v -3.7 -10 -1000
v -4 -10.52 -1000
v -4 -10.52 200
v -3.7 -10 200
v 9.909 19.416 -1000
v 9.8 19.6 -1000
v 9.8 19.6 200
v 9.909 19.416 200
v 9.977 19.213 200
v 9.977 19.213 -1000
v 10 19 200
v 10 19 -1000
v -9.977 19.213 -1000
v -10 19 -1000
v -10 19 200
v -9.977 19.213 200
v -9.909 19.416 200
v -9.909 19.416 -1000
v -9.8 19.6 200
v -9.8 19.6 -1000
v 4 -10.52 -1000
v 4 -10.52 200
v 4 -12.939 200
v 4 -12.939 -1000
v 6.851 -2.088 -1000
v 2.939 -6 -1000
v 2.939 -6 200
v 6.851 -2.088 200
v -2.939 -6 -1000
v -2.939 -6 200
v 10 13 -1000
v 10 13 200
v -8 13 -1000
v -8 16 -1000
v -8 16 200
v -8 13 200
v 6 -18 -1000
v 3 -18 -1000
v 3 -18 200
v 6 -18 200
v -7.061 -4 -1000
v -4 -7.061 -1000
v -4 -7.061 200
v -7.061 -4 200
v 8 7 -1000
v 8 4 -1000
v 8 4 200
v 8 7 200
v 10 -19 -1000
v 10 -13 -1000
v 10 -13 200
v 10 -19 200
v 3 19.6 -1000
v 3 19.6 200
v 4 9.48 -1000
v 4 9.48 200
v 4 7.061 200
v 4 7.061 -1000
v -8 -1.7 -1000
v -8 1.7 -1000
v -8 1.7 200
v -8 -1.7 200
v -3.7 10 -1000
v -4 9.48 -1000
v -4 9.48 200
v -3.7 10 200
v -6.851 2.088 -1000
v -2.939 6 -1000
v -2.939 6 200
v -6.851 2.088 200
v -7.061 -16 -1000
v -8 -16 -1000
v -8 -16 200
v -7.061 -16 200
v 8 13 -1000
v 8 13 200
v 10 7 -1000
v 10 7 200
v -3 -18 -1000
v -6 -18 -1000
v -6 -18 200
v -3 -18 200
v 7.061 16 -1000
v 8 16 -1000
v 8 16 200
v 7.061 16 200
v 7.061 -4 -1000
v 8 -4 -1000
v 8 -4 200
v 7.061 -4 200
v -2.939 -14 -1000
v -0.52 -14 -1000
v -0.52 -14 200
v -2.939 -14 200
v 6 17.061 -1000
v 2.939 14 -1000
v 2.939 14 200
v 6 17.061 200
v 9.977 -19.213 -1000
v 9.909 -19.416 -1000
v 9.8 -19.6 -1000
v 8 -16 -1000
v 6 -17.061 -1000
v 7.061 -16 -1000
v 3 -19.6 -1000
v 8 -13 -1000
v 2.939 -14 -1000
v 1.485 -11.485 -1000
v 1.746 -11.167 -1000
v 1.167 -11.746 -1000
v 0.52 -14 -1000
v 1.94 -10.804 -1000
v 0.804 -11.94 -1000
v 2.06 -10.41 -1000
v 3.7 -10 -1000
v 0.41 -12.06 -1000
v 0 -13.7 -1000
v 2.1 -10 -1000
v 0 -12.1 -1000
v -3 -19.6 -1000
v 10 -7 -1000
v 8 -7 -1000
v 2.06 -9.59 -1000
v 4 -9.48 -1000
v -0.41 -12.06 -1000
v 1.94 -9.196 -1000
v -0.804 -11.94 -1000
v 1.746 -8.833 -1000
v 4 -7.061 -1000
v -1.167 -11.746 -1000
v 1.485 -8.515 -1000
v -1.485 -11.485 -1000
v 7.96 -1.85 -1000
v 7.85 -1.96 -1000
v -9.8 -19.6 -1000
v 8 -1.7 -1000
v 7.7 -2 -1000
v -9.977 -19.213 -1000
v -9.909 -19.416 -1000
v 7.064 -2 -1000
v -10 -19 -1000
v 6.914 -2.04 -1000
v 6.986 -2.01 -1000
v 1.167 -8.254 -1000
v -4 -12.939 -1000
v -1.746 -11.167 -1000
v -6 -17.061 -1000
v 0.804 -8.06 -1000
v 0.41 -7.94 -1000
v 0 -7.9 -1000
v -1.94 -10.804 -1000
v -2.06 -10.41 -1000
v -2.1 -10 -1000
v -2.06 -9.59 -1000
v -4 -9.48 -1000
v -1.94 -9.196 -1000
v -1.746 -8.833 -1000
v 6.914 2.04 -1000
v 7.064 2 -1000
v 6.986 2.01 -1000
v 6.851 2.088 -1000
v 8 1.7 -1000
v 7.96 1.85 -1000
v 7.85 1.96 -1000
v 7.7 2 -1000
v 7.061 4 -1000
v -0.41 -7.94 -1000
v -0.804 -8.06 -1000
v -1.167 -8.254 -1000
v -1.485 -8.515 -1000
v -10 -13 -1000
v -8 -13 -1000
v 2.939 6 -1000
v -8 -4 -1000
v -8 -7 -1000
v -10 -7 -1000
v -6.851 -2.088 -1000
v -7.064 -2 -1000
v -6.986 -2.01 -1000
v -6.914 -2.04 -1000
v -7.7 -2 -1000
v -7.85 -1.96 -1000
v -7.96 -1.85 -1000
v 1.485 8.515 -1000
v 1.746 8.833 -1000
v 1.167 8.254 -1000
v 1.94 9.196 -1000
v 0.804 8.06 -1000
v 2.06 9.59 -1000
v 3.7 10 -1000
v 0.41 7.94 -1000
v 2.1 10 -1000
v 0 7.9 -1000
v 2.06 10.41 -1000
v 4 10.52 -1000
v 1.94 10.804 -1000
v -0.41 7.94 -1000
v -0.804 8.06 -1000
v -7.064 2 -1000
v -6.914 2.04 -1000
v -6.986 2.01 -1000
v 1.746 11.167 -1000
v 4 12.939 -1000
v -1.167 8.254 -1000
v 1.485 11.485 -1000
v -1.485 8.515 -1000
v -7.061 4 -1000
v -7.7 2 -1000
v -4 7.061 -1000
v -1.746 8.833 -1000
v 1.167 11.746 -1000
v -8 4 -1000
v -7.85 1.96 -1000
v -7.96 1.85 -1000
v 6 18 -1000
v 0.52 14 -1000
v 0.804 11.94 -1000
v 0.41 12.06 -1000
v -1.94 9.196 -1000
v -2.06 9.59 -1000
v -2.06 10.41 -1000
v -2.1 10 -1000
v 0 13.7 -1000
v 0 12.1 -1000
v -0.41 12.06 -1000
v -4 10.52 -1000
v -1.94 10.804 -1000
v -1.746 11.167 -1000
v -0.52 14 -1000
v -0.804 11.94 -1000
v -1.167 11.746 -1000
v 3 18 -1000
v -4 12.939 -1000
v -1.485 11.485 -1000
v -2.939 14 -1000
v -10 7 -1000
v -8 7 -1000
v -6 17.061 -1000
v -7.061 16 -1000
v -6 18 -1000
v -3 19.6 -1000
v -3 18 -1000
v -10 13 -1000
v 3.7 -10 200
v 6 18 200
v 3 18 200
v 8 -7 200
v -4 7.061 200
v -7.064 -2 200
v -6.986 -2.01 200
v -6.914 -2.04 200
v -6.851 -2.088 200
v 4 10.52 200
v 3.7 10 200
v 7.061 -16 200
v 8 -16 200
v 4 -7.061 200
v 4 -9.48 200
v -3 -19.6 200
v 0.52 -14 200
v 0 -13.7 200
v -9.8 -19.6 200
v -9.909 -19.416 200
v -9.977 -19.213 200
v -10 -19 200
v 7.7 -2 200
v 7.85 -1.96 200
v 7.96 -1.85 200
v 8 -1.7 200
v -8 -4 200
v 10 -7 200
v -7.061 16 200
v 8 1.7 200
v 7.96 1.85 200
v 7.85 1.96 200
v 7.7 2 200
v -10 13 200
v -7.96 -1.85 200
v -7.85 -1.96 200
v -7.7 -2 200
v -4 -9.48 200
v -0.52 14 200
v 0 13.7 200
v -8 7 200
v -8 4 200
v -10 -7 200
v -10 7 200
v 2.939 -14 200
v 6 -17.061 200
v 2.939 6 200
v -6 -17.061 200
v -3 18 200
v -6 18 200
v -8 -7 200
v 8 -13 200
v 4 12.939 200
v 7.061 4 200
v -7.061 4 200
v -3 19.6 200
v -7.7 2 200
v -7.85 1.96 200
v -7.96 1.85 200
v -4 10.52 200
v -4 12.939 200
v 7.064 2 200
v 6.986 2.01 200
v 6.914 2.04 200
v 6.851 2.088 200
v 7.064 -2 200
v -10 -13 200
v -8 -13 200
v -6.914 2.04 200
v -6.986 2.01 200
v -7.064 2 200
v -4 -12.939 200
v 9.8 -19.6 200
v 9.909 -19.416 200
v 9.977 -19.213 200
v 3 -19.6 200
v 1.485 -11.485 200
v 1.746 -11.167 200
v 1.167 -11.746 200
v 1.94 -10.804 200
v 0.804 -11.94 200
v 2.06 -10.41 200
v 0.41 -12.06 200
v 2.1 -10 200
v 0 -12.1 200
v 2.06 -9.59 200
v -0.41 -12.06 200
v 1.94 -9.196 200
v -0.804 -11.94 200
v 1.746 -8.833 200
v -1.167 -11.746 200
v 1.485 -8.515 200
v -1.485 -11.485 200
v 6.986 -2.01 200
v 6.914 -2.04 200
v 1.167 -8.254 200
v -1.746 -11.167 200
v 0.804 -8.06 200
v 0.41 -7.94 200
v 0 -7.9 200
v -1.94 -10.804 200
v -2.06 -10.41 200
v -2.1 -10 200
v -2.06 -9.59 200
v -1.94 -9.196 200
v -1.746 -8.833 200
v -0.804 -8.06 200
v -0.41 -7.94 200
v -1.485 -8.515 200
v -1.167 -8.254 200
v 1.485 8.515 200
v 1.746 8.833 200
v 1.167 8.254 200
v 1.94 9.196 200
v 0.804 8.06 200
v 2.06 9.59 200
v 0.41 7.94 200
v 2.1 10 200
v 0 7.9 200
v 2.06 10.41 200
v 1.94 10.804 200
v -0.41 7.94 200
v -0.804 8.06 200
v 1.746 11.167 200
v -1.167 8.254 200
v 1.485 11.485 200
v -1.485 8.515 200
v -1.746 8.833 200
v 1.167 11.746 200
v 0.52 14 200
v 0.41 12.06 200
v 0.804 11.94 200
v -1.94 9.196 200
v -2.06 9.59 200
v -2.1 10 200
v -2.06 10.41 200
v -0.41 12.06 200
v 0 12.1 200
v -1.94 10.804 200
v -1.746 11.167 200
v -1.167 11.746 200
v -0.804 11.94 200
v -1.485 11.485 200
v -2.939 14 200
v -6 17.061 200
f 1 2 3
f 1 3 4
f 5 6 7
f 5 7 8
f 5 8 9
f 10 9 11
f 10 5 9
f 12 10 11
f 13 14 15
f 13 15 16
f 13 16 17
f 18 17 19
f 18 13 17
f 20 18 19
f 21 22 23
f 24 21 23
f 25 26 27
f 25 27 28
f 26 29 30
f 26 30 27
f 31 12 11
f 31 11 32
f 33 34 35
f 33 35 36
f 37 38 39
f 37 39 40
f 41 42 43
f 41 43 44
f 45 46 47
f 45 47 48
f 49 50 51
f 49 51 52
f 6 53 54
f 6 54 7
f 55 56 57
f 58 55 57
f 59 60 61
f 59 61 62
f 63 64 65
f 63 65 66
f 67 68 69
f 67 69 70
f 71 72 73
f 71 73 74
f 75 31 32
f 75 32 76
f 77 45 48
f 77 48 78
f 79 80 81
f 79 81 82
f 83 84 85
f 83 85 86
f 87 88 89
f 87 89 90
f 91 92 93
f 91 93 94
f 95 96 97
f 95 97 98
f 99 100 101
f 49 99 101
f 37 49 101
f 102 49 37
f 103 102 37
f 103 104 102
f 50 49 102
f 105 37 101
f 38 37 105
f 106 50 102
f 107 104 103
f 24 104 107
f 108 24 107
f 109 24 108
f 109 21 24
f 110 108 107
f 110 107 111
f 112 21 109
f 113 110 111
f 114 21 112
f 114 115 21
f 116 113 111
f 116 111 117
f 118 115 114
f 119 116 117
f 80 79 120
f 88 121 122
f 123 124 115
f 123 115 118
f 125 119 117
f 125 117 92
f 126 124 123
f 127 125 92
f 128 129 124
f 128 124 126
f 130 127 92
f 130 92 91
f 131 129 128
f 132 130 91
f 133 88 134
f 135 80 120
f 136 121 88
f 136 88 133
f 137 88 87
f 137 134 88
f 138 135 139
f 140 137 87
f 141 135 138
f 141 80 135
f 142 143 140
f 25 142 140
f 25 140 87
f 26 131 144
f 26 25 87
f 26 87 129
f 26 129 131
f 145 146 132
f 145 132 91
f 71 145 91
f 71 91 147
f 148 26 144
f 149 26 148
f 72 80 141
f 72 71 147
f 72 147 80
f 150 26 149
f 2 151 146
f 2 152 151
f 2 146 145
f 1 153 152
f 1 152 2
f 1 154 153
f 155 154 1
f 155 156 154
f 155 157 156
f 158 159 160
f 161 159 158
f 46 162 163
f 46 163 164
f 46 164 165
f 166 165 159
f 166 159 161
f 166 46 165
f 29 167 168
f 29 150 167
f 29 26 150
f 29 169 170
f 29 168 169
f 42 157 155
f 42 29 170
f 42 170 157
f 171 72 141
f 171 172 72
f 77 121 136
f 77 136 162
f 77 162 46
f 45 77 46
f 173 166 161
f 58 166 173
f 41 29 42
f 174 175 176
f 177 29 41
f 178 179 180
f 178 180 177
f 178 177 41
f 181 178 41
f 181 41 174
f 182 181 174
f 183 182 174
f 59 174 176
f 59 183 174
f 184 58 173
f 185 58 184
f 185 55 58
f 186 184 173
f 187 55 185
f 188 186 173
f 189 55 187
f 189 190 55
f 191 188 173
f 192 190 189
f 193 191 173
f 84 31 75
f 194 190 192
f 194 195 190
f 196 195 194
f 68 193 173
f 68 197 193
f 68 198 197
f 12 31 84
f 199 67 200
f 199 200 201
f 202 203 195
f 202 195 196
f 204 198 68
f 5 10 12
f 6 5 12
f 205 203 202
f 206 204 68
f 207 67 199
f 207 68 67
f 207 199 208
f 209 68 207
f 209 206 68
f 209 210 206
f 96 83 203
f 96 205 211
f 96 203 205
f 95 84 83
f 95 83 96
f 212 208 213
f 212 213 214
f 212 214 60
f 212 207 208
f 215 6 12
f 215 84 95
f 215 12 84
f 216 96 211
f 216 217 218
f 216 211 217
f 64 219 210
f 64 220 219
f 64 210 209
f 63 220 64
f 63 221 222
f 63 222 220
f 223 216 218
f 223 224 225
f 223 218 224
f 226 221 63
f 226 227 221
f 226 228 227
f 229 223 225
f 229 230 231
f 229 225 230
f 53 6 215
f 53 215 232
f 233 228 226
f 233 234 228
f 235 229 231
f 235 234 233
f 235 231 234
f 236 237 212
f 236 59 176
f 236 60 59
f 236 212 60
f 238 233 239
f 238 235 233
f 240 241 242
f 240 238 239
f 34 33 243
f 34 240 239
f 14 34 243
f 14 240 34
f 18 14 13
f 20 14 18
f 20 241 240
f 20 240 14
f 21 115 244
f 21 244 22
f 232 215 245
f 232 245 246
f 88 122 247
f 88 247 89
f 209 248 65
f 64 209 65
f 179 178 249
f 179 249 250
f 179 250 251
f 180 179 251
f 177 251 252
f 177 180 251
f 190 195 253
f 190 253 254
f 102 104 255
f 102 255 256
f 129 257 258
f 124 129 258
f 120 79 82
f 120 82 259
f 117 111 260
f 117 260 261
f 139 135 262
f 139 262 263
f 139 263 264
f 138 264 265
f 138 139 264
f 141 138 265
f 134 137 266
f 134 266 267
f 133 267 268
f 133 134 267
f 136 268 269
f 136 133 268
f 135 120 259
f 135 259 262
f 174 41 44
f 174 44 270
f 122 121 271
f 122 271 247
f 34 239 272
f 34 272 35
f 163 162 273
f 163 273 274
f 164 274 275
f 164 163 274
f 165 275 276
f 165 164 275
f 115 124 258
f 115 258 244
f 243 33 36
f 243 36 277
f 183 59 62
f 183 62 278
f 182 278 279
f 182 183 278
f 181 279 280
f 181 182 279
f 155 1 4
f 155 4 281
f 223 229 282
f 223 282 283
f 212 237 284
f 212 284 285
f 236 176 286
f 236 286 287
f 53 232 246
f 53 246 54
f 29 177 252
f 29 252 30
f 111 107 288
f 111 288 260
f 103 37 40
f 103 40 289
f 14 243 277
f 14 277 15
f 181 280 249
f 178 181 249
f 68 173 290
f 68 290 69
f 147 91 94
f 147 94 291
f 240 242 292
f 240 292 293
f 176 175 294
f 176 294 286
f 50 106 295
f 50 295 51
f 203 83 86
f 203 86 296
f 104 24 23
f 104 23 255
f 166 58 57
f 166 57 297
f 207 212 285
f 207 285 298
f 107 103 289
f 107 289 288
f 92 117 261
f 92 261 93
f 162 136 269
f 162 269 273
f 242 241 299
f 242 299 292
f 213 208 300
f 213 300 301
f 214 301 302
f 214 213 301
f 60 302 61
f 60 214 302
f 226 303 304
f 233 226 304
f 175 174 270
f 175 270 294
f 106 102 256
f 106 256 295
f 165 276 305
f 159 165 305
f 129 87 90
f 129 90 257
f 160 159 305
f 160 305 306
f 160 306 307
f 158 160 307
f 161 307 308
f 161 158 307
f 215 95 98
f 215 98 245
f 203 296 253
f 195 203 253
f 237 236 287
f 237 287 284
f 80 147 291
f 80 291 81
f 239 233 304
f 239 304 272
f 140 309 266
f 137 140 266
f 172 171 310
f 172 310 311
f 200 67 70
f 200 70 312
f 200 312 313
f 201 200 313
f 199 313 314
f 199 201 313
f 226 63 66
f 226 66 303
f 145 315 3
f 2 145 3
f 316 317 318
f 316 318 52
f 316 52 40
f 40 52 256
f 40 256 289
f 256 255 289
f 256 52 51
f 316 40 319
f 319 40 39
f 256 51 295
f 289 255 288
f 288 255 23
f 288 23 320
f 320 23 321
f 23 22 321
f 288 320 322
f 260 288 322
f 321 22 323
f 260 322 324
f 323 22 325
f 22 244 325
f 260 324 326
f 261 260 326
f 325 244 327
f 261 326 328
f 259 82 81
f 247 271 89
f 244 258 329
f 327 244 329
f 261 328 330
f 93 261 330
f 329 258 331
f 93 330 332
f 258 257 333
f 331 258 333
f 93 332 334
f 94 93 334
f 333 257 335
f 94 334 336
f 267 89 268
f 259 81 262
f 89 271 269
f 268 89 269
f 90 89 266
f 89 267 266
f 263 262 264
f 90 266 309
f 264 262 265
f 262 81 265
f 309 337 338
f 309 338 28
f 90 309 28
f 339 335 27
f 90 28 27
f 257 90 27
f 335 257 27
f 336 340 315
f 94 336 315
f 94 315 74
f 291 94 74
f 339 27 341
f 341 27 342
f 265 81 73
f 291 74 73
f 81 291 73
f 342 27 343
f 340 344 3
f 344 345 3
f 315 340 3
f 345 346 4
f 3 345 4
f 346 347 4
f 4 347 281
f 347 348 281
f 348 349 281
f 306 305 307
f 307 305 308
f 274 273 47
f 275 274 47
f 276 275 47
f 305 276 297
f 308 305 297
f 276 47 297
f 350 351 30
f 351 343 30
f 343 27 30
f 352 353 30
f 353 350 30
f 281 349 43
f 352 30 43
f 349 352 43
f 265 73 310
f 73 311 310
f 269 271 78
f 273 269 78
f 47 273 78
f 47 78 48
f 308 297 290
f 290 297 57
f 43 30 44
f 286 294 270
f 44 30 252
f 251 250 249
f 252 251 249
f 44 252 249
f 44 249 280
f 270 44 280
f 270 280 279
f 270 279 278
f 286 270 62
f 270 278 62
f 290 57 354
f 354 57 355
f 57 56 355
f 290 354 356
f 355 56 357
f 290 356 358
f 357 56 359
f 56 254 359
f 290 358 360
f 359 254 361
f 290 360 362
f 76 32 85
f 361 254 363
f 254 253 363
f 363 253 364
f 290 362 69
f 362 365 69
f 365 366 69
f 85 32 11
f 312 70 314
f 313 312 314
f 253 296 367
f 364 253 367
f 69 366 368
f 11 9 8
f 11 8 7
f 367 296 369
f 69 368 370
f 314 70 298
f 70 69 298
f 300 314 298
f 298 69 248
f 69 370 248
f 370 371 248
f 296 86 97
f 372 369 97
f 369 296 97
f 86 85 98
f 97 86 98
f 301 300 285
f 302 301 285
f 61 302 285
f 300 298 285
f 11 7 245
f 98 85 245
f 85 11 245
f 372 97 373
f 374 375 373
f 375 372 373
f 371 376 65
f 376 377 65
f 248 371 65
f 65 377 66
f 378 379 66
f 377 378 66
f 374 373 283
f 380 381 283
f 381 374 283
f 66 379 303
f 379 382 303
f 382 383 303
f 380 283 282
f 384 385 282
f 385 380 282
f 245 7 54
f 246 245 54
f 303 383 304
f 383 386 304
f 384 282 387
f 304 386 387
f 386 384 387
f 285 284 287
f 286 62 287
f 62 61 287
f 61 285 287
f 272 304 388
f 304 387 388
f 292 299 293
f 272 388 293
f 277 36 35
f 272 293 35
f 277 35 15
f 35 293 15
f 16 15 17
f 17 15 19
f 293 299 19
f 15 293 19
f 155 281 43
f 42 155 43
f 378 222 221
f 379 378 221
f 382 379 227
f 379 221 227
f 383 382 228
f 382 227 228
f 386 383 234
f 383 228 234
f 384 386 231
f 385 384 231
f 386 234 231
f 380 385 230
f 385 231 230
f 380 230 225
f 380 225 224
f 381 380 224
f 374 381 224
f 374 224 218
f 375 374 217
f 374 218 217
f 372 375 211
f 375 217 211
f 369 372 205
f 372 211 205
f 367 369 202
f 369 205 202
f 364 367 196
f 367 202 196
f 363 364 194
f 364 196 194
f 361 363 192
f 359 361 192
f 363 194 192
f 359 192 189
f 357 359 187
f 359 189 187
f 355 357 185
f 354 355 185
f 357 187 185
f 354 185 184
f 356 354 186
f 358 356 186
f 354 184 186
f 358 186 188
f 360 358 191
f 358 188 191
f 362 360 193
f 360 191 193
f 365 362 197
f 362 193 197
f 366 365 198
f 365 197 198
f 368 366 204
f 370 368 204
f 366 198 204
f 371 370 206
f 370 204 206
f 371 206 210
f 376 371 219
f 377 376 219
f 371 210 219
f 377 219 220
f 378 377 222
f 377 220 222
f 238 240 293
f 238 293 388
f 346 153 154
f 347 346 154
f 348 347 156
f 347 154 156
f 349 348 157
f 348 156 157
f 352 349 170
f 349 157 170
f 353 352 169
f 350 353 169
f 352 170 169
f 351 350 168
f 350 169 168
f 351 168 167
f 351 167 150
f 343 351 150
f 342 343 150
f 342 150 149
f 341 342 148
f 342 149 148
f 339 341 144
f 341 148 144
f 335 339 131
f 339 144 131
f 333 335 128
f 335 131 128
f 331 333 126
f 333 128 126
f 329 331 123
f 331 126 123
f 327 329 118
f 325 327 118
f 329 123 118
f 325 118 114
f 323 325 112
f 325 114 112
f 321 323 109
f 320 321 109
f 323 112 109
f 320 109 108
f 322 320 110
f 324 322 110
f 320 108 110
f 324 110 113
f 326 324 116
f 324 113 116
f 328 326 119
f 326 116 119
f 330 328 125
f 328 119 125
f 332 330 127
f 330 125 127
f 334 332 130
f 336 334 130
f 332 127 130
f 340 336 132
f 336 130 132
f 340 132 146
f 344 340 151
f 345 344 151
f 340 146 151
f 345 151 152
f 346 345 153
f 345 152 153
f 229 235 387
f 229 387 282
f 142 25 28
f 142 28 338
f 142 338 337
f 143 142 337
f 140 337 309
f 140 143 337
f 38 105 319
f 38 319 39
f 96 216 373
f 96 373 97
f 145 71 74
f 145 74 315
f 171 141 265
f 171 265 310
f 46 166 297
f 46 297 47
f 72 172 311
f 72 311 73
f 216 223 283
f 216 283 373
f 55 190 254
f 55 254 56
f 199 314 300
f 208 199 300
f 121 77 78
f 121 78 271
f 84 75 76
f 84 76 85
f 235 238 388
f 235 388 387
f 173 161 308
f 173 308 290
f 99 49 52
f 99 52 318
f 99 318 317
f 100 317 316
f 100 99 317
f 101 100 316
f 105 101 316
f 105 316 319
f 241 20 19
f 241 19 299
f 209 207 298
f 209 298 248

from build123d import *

# Parameters (mm, degrees)
SKETCH1_R           = 2.1
BOSS_EXTRUDE1_DEPTH = 1200


with BuildPart() as part:
    # Sketch1 → Boss-Extrude1 (new body)
    with BuildSketch(Plane(origin=(0, 0, -1000), x_dir=(-1, 0, 0), z_dir=(0, 0, -1))):
        with BuildLine():
            Line((10, -7), (10, 7))
            Line((10, 7), (8, 7))
            Line((8, 7), (8, 4))
            Line((8, 4), (7.060660172, 4))
            Line((7.060660172, 4), (4, 7.060660172))
            Line((4, 7.060660172), (4, 9.480384758))
            Line((4, 9.480384758), (3.7, 10))
            Line((3.7, 10), (4, 10.519615242))
            Line((4, 10.519615242), (4, 12.939339828))
            Line((4, 12.939339828), (7.060660172, 16))
            Line((7.060660172, 16), (8, 16))
            Line((8, 16), (8, 13))
            Line((8, 13), (10, 13))
            Line((10, 13), (10, 19))
            ThreePointArc((10, 19), (9.948683298, 19.316227766), (9.8, 19.6))
            Line((9.8, 19.6), (3, 19.6))
            Line((3, 19.6), (3, 18))
            Line((3, 18), (6, 18))
            Line((6, 18), (6, 17.060660172))
            Line((6, 17.060660172), (2.939339828, 14))
            Line((2.939339828, 14), (0.519615242, 14))
            Line((0.519615242, 14), (0, 13.7))
            Line((0, 13.7), (-0.519615242, 14))
            Line((-0.519615242, 14), (-2.939339828, 14))
            Line((-2.939339828, 14), (-6, 17.060660172))
            Line((-6, 17.060660172), (-6, 18))
            Line((-6, 18), (-3, 18))
            Line((-3, 18), (-3, 19.6))
            Line((-3, 19.6), (-9.8, 19.6))
            ThreePointArc((-9.8, 19.6), (-9.948683298, 19.316227766), (-10, 19))
            Line((-10, 19), (-10, 13))
            Line((-10, 13), (-8, 13))
            Line((-8, 13), (-8, 16))
            Line((-8, 16), (-7.060660172, 16))
            Line((-7.060660172, 16), (-4, 12.939339828))
            Line((-4, 12.939339828), (-4, 10.519615242))
            Line((-4, 10.519615242), (-3.7, 10))
            Line((-3.7, 10), (-4, 9.480384758))
            Line((-4, 9.480384758), (-4, 7.060660172))
            Line((-4, 7.060660172), (-7.060660172, 4))
            Line((-7.060660172, 4), (-8, 4))
            Line((-8, 4), (-8, 7))
            Line((-8, 7), (-10, 7))
            Line((-10, 7), (-10, -7))
            Line((-10, -7), (-8, -7))
            Line((-8, -7), (-8, -4))
            Line((-8, -4), (-7.060660172, -4))
            Line((-7.060660172, -4), (-4, -7.060660172))
            Line((-4, -7.060660172), (-4, -9.480384758))
            Line((-4, -9.480384758), (-3.7, -10))
            Line((-3.7, -10), (-4, -10.519615242))
            Line((-4, -10.519615242), (-4, -12.939339828))
            Line((-4, -12.939339828), (-7.060660172, -16))
            Line((-7.060660172, -16), (-8, -16))
            Line((-8, -16), (-8, -13))
            Line((-8, -13), (-10, -13))
            Line((-10, -13), (-10, -19))
            ThreePointArc((-10, -19), (-9.948683298, -19.316227766), (-9.8, -19.6))
            Line((-9.8, -19.6), (-3, -19.6))
            Line((-3, -19.6), (-3, -18))
            Line((-3, -18), (-6, -18))
            Line((-6, -18), (-6, -17.060660172))
            Line((-6, -17.060660172), (-2.939339828, -14))
            Line((-2.939339828, -14), (-0.519615242, -14))
            Line((-0.519615242, -14), (0, -13.7))
            Line((0, -13.7), (0.519615242, -14))
            Line((0.519615242, -14), (2.939339828, -14))
            Line((2.939339828, -14), (6, -17.060660172))
            Line((6, -17.060660172), (6, -18))
            Line((6, -18), (3, -18))
            Line((3, -18), (3, -19.6))
            Line((3, -19.6), (9.8, -19.6))
            ThreePointArc((9.8, -19.6), (9.948683298, -19.316227766), (10, -19))
            Line((10, -19), (10, -13))
            Line((10, -13), (8, -13))
            Line((8, -13), (8, -16))
            Line((8, -16), (7.060660172, -16))
            Line((7.060660172, -16), (4, -12.939339828))
            Line((4, -12.939339828), (4, -10.519615242))
            Line((4, -10.519615242), (3.7, -10))
            Line((3.7, -10), (4, -9.480384758))
            Line((4, -9.480384758), (4, -7.060660172))
            Line((4, -7.060660172), (7.060660172, -4))
            Line((7.060660172, -4), (8, -4))
            Line((8, -4), (8, -7))
            Line((8, -7), (10, -7))
        make_face()
        with Locations((0, -10)):
            Circle(SKETCH1_R, mode=Mode.SUBTRACT)
        with Locations((0, 10)):
            Circle(SKETCH1_R, mode=Mode.SUBTRACT)
        with BuildLine():
            Line((8, 1.7), (8, -1.7))
            ThreePointArc((8, -1.7), (7.912132034, -1.912132034), (7.7, -2))
            Line((7.7, -2), (7.063603897, -2))
            ThreePointArc((7.063603897, -2), (6.948798867, -2.02283614), (6.851471863, -2.087867966))
            Line((6.851471863, -2.087867966), (2.939339828, -6))
            Line((2.939339828, -6), (-2.939339828, -6))
            Line((-2.939339828, -6), (-6.851471863, -2.087867966))
            ThreePointArc((-6.851471863, -2.087867966), (-6.948798867, -2.02283614), (-7.063603897, -2))
            Line((-7.063603897, -2), (-7.7, -2))
            ThreePointArc((-7.7, -2), (-7.912132034, -1.912132034), (-8, -1.7))
            Line((-8, -1.7), (-8, 1.7))
            ThreePointArc((-8, 1.7), (-7.912132034, 1.912132034), (-7.7, 2))
            Line((-7.7, 2), (-7.063603897, 2))
            ThreePointArc((-7.063603897, 2), (-6.948798867, 2.02283614), (-6.851471863, 2.087867966))
            Line((-6.851471863, 2.087867966), (-2.939339828, 6))
            Line((-2.939339828, 6), (2.939339828, 6))
            Line((2.939339828, 6), (6.851471863, 2.087867966))
            ThreePointArc((6.851471863, 2.087867966), (6.948798867, 2.02283614), (7.063603897, 2))
            Line((7.063603897, 2), (7.7, 2))
            ThreePointArc((7.7, 2), (7.912132034, 1.912132034), (8, 1.7))
        make_face(mode=Mode.SUBTRACT)
    extrude(amount=-BOSS_EXTRUDE1_DEPTH)


solid = part.part
